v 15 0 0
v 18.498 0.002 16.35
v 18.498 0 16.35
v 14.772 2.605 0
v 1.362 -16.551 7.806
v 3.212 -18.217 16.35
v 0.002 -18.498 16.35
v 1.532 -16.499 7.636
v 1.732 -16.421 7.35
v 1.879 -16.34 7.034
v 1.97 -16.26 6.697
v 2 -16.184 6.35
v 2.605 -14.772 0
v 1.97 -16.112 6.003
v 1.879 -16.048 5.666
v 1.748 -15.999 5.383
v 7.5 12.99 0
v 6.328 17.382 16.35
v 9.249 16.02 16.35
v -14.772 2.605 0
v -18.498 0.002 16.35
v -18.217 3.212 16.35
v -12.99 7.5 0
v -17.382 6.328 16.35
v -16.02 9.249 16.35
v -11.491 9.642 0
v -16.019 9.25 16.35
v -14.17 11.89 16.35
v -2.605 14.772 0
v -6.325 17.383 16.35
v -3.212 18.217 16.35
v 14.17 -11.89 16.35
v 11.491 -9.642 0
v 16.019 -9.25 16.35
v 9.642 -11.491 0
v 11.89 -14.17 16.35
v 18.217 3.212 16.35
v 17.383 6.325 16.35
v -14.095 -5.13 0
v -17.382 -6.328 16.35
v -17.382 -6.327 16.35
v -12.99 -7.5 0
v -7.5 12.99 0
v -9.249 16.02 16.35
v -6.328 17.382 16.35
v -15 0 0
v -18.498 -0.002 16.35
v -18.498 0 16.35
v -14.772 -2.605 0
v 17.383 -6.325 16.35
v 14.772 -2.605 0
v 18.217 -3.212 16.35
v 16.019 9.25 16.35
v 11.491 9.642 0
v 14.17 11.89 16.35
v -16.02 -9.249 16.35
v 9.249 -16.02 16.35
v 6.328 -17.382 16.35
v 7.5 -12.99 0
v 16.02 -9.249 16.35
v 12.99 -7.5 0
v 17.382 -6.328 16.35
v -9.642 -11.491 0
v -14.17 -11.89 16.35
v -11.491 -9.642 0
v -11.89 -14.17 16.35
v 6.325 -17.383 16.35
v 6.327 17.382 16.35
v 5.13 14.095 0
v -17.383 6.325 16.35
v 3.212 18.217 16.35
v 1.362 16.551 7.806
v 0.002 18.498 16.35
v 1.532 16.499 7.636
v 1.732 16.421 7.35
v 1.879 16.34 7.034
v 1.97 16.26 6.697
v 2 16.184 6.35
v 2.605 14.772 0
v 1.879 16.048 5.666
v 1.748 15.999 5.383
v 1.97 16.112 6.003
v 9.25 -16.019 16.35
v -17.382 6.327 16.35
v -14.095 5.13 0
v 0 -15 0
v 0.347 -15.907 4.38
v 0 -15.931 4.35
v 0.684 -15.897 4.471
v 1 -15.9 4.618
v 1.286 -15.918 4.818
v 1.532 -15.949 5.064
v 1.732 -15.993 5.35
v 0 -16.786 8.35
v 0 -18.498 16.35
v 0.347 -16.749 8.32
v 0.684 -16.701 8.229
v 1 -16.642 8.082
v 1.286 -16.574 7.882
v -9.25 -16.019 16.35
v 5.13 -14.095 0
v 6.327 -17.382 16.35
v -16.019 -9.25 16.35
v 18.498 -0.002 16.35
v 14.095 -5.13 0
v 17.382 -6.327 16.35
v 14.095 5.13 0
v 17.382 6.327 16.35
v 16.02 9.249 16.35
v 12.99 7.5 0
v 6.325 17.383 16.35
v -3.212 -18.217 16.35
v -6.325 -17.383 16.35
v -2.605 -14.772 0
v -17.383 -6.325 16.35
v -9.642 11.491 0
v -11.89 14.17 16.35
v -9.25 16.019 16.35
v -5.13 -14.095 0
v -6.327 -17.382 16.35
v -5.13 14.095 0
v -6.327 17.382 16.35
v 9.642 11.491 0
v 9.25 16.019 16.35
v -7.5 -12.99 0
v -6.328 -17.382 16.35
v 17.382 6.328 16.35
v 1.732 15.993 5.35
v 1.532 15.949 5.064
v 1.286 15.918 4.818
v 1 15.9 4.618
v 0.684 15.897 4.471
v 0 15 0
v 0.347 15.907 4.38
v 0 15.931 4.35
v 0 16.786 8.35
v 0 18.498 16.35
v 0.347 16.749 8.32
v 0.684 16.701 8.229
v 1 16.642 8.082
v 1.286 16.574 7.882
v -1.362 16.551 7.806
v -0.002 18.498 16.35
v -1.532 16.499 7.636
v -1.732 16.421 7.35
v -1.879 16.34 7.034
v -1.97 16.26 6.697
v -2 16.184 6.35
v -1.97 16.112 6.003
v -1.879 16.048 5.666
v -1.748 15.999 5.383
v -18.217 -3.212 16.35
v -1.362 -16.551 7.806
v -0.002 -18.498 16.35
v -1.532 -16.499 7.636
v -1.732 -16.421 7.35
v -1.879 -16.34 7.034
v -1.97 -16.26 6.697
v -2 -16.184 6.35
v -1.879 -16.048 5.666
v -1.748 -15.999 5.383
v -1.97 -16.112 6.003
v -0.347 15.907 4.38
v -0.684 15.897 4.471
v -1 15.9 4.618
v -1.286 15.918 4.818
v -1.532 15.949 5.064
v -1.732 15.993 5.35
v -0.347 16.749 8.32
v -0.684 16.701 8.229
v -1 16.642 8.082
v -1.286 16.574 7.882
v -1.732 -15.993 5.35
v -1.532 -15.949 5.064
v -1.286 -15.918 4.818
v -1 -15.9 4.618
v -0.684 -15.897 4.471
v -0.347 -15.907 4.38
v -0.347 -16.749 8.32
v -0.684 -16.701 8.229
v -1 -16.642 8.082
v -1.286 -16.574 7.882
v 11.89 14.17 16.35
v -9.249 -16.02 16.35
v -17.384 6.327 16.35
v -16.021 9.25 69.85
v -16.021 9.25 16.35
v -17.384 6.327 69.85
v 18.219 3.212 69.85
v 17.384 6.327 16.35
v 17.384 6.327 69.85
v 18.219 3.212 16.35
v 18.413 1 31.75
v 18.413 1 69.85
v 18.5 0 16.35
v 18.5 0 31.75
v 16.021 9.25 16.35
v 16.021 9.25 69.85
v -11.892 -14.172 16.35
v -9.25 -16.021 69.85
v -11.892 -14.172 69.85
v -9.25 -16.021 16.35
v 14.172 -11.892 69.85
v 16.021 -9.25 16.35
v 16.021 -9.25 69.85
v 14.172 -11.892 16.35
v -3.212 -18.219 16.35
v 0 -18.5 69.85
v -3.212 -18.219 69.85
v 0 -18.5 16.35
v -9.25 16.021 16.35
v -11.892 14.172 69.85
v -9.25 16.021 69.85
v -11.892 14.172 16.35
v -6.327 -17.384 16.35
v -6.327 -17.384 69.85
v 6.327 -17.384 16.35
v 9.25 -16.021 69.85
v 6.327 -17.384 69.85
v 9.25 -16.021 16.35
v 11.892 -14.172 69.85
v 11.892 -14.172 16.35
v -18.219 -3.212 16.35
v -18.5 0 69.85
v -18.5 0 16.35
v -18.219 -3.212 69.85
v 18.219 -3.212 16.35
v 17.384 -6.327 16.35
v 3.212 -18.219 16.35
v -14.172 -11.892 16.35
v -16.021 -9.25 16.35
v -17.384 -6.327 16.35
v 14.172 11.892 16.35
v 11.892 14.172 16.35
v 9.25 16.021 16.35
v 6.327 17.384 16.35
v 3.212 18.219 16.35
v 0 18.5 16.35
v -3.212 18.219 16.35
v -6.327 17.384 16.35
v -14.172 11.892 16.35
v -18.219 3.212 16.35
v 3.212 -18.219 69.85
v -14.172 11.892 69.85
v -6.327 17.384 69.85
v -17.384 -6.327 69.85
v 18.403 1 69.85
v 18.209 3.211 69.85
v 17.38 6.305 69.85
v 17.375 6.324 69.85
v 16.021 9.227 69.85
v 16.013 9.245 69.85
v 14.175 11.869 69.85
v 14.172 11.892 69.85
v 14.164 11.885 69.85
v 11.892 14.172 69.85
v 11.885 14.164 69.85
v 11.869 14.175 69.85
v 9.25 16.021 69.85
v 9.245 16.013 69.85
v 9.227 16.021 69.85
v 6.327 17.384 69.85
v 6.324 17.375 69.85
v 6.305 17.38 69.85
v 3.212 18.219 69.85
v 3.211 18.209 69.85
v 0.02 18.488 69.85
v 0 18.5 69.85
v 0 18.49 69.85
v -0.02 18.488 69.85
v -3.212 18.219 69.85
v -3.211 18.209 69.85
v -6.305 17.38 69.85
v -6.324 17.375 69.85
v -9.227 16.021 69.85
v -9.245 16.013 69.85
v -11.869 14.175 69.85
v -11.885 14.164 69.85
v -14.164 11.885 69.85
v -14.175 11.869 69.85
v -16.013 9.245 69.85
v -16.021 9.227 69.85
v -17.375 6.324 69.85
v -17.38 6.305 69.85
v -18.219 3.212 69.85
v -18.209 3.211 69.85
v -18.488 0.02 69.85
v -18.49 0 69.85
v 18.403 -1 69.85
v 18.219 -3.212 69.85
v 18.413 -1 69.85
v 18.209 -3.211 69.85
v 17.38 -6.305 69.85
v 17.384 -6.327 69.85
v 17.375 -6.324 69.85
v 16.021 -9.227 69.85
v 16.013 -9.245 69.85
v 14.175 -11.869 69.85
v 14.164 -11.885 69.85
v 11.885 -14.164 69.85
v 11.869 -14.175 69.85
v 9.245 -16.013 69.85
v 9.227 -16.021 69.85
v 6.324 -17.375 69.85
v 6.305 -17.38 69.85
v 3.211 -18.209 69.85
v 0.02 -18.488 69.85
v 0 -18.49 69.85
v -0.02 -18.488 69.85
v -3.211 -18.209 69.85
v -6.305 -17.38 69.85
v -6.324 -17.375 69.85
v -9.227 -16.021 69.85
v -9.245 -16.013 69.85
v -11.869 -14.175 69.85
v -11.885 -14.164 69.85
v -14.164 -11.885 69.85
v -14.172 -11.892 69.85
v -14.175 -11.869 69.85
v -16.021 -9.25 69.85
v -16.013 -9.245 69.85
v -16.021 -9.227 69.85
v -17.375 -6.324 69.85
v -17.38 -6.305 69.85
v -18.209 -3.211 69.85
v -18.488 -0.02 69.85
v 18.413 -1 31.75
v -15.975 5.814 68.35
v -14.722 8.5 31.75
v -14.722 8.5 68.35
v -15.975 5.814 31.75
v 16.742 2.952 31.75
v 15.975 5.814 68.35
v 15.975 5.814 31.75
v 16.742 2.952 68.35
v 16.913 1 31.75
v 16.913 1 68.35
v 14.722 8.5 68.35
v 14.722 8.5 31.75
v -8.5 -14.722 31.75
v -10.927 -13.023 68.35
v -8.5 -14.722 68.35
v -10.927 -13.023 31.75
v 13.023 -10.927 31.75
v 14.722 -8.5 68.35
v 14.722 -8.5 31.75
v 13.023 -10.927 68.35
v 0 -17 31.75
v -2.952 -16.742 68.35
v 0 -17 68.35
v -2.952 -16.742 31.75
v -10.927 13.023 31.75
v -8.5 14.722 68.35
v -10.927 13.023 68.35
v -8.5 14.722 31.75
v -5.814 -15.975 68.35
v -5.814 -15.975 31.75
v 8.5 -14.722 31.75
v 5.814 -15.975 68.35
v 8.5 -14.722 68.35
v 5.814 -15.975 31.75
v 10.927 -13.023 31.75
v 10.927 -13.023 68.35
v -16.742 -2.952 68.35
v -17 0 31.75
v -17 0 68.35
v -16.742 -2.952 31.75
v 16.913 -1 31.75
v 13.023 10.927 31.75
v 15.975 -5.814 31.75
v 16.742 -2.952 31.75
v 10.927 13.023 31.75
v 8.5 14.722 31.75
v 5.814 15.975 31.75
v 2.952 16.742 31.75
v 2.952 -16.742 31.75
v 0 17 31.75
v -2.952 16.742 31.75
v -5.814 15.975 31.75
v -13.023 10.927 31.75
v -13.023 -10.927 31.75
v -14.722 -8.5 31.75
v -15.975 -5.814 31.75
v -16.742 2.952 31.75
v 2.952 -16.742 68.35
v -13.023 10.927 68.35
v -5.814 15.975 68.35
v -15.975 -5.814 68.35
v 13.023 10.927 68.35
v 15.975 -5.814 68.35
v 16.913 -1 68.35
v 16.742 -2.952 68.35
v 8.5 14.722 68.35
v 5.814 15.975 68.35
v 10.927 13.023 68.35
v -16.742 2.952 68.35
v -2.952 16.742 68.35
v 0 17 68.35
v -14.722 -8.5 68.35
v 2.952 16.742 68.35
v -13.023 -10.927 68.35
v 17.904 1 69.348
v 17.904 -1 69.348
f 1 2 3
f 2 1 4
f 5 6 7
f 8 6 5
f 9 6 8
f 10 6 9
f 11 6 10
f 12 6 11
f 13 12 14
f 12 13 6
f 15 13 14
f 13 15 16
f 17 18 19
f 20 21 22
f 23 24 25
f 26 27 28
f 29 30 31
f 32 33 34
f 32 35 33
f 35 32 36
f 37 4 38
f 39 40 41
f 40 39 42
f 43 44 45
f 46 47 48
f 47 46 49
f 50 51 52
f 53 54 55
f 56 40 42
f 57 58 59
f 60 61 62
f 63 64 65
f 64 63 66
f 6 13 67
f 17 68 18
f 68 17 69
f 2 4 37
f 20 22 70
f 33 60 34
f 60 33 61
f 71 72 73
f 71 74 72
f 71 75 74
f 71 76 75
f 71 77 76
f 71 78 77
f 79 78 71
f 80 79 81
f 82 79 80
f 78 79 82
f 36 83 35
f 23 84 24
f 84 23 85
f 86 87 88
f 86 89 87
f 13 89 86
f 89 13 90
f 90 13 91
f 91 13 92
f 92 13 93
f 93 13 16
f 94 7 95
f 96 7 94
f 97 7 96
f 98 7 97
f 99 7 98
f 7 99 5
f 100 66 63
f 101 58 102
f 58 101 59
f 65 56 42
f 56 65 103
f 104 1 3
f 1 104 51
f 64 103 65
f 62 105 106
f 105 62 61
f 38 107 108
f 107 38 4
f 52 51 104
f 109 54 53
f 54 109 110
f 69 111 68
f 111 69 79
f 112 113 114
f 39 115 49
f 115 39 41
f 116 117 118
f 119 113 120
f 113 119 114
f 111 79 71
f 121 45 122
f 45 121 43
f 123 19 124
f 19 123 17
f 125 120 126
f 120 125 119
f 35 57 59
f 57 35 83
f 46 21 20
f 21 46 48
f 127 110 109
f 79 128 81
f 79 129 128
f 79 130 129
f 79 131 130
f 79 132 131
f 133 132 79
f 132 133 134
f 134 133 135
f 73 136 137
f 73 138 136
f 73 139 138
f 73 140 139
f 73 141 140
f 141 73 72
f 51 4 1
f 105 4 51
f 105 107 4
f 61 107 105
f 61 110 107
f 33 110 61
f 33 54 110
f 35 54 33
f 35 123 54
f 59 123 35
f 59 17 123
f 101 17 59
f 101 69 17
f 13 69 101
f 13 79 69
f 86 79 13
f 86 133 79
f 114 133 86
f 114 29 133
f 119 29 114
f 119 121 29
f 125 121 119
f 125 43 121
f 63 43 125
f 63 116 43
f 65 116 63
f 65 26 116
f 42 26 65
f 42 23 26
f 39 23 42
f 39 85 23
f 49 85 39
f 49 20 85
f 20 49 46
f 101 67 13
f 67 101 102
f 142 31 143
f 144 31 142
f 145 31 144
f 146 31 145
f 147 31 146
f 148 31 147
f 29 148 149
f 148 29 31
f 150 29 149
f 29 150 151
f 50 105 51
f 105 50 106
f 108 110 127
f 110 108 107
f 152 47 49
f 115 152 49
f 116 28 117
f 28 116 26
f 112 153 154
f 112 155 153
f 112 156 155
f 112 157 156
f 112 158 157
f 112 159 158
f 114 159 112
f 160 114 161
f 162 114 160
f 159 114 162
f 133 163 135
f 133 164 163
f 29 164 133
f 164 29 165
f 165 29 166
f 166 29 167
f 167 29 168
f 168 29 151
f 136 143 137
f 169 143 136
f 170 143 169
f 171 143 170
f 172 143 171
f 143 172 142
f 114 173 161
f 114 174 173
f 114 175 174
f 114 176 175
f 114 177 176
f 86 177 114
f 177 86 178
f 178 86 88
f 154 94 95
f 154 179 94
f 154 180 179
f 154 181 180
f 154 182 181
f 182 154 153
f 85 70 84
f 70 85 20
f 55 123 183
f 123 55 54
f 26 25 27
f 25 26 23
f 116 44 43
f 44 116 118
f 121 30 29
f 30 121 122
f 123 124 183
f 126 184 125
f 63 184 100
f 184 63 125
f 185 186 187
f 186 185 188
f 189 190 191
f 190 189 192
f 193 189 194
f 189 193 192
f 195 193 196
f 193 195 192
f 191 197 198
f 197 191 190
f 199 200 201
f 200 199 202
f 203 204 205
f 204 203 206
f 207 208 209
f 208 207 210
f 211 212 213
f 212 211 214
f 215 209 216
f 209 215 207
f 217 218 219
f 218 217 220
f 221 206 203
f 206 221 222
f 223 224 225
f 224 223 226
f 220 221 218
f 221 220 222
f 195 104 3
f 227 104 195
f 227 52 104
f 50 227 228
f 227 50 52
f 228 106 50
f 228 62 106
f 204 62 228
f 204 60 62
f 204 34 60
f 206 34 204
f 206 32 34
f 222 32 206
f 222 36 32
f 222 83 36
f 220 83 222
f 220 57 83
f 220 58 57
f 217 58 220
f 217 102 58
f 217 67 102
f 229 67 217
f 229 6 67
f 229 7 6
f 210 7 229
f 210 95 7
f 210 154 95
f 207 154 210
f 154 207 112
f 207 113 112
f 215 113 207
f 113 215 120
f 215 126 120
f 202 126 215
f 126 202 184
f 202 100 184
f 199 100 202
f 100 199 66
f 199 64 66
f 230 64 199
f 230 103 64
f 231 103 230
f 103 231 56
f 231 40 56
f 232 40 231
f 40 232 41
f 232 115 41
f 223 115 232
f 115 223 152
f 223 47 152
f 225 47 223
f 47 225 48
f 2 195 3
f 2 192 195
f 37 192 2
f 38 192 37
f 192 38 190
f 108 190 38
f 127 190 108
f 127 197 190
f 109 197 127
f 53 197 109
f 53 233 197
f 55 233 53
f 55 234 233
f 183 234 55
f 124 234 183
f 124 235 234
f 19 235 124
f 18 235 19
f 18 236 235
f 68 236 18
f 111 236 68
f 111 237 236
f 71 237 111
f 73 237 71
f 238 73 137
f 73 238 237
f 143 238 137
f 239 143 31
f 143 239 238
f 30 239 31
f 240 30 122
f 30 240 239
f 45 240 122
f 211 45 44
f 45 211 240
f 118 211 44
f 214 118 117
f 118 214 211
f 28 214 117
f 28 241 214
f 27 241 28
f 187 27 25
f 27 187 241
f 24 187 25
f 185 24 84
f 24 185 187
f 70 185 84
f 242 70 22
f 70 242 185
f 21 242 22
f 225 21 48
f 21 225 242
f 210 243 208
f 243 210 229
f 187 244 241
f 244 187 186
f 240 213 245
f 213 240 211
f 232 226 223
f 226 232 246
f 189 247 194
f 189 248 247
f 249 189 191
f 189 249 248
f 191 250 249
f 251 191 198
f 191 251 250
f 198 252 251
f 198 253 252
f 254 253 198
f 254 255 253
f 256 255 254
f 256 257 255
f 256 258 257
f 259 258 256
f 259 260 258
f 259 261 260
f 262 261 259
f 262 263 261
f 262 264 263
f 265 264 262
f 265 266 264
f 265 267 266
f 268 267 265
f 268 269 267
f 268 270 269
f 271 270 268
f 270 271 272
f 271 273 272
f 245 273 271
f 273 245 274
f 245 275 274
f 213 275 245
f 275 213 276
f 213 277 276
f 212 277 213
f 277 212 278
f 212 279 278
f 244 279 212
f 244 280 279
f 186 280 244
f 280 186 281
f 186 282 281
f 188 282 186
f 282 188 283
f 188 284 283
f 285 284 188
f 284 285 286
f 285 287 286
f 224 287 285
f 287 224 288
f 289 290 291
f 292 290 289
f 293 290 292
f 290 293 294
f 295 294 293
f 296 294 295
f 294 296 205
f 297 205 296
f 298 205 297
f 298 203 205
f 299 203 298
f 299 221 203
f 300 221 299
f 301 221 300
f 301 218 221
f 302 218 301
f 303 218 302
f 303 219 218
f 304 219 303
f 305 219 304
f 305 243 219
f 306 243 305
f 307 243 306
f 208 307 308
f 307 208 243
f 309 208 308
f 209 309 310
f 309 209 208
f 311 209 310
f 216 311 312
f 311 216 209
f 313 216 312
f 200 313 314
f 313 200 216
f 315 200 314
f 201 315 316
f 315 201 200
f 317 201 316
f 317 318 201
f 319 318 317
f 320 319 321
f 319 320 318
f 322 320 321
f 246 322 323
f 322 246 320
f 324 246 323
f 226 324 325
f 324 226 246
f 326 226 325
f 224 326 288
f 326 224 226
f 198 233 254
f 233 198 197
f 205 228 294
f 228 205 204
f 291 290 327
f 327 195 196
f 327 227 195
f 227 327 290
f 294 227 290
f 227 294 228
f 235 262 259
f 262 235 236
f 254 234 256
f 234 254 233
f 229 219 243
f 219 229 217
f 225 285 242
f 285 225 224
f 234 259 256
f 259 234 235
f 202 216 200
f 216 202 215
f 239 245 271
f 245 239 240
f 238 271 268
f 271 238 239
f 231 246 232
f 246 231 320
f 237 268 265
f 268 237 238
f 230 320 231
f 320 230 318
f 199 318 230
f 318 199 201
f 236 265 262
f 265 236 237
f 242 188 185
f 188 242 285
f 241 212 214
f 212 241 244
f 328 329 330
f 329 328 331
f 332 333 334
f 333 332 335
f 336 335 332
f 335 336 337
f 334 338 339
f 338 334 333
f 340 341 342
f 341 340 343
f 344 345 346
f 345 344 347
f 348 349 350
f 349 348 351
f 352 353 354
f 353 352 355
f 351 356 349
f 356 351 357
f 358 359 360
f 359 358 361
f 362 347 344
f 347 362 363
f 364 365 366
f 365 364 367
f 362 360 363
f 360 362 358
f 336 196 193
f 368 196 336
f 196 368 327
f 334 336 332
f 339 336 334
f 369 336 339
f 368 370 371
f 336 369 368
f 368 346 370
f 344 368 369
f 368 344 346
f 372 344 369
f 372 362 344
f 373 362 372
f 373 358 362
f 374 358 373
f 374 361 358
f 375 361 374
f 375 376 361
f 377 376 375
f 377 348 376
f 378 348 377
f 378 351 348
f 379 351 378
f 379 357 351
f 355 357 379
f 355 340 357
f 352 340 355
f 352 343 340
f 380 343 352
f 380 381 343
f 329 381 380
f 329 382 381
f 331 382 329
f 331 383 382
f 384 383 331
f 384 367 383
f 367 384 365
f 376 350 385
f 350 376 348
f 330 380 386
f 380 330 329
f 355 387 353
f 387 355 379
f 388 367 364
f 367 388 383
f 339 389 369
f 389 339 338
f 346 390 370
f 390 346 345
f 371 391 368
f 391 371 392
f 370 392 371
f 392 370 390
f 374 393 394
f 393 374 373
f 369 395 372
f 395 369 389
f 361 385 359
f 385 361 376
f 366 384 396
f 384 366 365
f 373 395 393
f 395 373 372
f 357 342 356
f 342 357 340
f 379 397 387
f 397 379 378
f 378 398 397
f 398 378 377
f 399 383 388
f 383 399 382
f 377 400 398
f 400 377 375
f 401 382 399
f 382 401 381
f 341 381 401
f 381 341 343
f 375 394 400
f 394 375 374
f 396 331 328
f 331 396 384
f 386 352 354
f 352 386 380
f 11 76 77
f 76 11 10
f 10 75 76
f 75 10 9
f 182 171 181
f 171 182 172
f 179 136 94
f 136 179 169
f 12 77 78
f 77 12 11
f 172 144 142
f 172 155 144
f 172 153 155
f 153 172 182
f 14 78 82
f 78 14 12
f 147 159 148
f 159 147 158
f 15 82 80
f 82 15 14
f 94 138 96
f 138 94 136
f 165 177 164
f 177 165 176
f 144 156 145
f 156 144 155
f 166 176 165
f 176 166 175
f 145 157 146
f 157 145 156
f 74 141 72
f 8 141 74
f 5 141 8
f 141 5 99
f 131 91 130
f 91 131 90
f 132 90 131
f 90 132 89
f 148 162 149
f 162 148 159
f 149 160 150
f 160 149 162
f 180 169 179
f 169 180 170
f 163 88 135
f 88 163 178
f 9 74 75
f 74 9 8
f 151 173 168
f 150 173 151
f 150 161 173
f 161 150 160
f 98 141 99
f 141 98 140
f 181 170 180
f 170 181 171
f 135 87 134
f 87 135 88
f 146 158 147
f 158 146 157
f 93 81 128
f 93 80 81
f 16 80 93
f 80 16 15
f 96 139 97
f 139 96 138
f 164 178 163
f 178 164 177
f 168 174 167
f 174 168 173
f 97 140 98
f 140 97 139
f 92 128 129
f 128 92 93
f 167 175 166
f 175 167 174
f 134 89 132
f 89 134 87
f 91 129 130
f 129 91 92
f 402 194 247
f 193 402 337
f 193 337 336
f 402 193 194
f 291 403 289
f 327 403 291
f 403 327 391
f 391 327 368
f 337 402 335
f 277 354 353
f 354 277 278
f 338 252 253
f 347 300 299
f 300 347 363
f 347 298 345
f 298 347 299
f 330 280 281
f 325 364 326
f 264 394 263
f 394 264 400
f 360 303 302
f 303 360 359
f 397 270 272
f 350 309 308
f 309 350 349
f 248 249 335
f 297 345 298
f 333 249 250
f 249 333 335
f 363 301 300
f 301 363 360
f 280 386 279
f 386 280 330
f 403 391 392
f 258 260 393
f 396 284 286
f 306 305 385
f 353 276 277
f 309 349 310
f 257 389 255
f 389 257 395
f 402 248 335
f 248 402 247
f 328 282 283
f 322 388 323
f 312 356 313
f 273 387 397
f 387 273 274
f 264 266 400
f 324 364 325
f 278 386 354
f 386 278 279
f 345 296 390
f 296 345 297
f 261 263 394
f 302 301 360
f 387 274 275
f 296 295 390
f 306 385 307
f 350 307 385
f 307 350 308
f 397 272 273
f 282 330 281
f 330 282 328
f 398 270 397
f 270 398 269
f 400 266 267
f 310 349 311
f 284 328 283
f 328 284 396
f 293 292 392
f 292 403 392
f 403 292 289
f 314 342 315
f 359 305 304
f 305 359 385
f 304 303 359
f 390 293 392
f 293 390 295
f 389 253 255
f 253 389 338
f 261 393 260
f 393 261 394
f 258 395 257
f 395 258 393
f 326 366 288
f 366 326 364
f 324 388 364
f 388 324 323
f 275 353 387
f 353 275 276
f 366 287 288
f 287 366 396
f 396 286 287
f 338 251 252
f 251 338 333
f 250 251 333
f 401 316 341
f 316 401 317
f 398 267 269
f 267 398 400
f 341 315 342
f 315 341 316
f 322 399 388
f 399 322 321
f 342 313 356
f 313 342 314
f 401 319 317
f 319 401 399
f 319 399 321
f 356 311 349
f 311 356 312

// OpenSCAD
innerDiameter = 34;
slitWidth = 2;
topDiameter = 30;
lengthToHole = 25.4*1;
lengthPastHole = 25.4*0.25;
holderLength = 25.4*1.5;
holeDiameter = 4;
narrowLength = lengthPastHole+10;
wall = 1.5;

nudge = 0.01;

od = innerDiameter + 2*wall;
length = lengthToHole+lengthPastHole+holderLength;

$fn = 36;

difference() {
    union() {
    cylinder(d1=topDiameter,d2=od,h=narrowLength+nudge);
    translate([0,0,narrowLength]) cylinder(d=od,h=length-narrowLength);
    }
    translate([0,0,lengthPastHole+lengthToHole]) cylinder(d=innerDiameter,h=holderLength+nudge);
    translate([0,0,lengthPastHole])
    rotate([90,0,0])
    cylinder(d=holeDiameter,h=2*(od),center=true);
    translate([0,-slitWidth/2,lengthPastHole+lengthToHole])
    cube([od,slitWidth,holderLength+nudge]);
    translate([0,0,length-wall])
    cylinder(d1=innerDiameter,d2=od,h=wall+nudge);
}
